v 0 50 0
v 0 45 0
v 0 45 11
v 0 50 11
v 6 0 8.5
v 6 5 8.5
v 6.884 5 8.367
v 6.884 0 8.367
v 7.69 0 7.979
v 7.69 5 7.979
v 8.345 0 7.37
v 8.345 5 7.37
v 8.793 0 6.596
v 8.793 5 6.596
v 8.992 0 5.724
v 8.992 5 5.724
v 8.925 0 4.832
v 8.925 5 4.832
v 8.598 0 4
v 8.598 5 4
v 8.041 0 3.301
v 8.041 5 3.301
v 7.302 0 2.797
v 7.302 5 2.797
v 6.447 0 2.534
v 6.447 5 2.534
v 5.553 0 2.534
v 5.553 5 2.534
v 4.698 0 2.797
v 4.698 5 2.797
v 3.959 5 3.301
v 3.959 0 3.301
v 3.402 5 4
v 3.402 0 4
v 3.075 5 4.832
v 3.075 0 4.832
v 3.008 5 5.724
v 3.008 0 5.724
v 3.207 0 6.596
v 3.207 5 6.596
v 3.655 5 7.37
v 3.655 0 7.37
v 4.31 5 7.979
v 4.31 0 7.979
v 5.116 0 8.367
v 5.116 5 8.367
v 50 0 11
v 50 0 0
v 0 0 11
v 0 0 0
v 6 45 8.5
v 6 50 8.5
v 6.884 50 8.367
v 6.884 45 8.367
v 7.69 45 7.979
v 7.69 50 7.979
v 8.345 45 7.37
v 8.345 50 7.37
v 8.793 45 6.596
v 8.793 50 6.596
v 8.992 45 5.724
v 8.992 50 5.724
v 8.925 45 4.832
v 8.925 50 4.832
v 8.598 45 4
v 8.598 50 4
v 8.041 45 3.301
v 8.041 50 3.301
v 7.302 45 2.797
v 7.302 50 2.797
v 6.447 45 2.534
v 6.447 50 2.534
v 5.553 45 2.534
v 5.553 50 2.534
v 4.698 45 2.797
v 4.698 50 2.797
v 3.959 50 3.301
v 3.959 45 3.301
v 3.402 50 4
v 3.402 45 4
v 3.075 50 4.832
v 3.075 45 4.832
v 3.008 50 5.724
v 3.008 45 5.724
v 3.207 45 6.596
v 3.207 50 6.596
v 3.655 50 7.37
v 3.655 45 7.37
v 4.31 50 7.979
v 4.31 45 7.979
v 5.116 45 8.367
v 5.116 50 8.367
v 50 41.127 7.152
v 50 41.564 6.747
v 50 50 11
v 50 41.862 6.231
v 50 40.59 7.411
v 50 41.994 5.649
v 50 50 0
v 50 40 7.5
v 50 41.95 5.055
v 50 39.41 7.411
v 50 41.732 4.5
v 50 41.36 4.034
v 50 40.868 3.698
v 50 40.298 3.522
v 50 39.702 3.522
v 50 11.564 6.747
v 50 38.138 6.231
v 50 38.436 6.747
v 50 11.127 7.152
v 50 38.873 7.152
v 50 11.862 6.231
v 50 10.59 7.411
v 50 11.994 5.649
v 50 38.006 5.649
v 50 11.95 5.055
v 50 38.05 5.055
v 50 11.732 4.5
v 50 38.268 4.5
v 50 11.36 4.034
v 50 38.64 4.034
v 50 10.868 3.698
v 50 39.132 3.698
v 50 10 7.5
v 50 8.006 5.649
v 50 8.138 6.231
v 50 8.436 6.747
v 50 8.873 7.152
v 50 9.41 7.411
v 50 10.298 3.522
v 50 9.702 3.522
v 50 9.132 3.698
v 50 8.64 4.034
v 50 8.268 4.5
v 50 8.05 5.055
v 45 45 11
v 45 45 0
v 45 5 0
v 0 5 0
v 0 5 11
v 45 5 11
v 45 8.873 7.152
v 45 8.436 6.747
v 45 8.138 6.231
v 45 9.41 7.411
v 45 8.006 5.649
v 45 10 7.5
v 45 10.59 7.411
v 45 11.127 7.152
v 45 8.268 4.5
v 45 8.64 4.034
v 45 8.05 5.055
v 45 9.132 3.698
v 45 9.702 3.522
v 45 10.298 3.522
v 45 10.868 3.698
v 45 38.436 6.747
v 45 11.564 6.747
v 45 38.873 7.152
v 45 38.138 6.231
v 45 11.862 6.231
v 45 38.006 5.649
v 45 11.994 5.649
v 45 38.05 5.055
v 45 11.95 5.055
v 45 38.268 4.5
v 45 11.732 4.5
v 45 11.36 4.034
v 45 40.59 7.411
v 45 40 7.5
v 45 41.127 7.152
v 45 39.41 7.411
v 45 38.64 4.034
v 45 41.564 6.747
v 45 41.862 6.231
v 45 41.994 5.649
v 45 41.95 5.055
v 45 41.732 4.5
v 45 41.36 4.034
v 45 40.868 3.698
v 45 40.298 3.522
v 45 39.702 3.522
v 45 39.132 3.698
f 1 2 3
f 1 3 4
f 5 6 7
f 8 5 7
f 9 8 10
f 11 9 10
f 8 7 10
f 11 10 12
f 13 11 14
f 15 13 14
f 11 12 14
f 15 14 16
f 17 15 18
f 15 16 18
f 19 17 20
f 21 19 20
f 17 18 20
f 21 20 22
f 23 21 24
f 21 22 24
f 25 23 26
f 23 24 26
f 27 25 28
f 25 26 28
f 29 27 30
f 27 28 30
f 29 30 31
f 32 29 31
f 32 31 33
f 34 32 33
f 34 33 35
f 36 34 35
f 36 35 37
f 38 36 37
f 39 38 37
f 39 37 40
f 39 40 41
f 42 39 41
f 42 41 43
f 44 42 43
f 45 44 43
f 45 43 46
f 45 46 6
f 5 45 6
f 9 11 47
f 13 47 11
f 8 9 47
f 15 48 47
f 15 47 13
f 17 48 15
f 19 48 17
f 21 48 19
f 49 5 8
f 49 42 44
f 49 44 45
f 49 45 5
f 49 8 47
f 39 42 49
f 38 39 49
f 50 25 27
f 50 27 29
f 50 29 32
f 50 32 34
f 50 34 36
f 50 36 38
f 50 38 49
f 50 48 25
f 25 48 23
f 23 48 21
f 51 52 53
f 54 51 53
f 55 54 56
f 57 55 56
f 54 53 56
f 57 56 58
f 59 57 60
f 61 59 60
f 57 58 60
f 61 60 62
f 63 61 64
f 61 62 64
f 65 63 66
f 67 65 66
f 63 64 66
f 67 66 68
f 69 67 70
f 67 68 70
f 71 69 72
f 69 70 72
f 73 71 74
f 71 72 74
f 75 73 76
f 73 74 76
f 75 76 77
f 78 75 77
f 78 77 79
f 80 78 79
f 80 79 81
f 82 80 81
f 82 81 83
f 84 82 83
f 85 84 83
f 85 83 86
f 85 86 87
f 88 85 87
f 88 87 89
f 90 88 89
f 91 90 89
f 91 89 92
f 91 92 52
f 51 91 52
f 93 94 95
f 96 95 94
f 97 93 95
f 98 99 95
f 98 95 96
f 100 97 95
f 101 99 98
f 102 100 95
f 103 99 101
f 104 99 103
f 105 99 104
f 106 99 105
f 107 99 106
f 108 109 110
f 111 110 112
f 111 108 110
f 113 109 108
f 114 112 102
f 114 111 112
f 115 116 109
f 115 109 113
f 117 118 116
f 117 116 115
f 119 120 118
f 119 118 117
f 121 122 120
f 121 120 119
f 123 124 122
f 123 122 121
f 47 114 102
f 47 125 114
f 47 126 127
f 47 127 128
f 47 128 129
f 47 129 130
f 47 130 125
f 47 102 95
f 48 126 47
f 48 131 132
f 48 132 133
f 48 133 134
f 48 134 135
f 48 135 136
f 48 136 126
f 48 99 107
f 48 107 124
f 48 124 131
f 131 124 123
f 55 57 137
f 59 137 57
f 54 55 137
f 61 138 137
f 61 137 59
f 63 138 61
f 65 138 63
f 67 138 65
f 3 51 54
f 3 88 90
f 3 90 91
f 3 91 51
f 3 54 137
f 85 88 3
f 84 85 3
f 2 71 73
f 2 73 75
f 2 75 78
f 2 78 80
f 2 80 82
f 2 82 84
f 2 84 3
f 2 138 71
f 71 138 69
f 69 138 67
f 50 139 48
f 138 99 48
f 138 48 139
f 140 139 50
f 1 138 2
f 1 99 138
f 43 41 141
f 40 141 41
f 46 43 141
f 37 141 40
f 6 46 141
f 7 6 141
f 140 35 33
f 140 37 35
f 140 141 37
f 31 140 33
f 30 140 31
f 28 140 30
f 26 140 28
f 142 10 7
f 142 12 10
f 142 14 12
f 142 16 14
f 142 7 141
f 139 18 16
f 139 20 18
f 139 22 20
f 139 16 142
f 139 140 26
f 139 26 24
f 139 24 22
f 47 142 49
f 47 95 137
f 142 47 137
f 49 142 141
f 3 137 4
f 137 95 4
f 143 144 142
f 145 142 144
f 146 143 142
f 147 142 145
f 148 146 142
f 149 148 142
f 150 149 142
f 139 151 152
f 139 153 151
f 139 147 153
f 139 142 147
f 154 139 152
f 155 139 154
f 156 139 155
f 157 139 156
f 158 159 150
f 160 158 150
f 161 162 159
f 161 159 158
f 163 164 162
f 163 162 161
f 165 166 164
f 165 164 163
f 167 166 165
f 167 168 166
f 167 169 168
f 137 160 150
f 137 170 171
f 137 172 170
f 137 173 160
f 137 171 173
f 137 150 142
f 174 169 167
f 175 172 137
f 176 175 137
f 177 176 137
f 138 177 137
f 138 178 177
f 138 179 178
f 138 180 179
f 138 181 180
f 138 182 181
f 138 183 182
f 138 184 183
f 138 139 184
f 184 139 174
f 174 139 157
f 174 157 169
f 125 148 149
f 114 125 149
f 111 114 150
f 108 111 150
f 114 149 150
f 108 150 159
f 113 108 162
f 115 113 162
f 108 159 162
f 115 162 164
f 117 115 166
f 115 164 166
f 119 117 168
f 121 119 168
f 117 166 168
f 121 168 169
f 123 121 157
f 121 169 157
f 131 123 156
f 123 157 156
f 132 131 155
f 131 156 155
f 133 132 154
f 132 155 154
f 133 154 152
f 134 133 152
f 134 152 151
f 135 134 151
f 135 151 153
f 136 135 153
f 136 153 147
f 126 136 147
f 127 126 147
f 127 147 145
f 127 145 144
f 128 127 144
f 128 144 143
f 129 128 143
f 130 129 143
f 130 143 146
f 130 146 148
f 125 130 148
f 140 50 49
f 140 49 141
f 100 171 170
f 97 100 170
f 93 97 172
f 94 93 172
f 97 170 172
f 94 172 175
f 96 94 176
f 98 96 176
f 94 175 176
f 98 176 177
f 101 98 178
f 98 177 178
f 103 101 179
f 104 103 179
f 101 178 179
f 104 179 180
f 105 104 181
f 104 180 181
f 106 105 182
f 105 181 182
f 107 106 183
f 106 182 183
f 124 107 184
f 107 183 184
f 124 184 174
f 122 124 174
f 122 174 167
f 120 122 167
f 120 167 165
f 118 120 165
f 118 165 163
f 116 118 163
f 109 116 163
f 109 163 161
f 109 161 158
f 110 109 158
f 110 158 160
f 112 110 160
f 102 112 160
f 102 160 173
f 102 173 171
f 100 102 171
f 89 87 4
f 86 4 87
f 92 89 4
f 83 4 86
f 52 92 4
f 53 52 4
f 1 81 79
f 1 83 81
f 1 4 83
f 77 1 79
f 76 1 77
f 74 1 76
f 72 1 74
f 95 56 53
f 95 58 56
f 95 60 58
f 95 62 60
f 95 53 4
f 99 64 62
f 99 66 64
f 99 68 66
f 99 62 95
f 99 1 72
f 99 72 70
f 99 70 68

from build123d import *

# Parameters (mm, degrees)
BOSS_EXTRUDE1_DEPTH = 11
SKETCH2_R           = 3
CUT_EXTRUDE1_DEPTH  = 60
SKETCH4_R           = 2
CUT_EXTRUDE2_DEPTH  = 11


with BuildPart() as part:
    # Sketch1 → Boss-Extrude1 (new body)
    with BuildSketch(Plane.XY):
        Polygon((0, 50), (50, 50), (50, 0), (0, 0), (0, 5), (45, 5), (45, 45), (0, 45), align=None)
    extrude(amount=BOSS_EXTRUDE1_DEPTH)

    # Sketch2 → Cut-Extrude1 (cut)
    with BuildSketch(Plane(origin=(0, 50, 0), x_dir=(1, 0, 0), z_dir=(0, 1, 0))):
        with Locations(Location((6, -5.5, 0), (0, 0, 270))):
            Circle(SKETCH2_R)
    extrude(amount=-CUT_EXTRUDE1_DEPTH, mode=Mode.SUBTRACT)

    # Sketch4 → Cut-Extrude2 (cut)
    with BuildSketch(Plane.ZY.offset(-45)):
        with Locations((5.5, 40)):
            Circle(SKETCH4_R)
        with Locations((5.5, 10)):
            Circle(SKETCH4_R)
    extrude(amount=-CUT_EXTRUDE2_DEPTH, mode=Mode.SUBTRACT)


solid = part.part
